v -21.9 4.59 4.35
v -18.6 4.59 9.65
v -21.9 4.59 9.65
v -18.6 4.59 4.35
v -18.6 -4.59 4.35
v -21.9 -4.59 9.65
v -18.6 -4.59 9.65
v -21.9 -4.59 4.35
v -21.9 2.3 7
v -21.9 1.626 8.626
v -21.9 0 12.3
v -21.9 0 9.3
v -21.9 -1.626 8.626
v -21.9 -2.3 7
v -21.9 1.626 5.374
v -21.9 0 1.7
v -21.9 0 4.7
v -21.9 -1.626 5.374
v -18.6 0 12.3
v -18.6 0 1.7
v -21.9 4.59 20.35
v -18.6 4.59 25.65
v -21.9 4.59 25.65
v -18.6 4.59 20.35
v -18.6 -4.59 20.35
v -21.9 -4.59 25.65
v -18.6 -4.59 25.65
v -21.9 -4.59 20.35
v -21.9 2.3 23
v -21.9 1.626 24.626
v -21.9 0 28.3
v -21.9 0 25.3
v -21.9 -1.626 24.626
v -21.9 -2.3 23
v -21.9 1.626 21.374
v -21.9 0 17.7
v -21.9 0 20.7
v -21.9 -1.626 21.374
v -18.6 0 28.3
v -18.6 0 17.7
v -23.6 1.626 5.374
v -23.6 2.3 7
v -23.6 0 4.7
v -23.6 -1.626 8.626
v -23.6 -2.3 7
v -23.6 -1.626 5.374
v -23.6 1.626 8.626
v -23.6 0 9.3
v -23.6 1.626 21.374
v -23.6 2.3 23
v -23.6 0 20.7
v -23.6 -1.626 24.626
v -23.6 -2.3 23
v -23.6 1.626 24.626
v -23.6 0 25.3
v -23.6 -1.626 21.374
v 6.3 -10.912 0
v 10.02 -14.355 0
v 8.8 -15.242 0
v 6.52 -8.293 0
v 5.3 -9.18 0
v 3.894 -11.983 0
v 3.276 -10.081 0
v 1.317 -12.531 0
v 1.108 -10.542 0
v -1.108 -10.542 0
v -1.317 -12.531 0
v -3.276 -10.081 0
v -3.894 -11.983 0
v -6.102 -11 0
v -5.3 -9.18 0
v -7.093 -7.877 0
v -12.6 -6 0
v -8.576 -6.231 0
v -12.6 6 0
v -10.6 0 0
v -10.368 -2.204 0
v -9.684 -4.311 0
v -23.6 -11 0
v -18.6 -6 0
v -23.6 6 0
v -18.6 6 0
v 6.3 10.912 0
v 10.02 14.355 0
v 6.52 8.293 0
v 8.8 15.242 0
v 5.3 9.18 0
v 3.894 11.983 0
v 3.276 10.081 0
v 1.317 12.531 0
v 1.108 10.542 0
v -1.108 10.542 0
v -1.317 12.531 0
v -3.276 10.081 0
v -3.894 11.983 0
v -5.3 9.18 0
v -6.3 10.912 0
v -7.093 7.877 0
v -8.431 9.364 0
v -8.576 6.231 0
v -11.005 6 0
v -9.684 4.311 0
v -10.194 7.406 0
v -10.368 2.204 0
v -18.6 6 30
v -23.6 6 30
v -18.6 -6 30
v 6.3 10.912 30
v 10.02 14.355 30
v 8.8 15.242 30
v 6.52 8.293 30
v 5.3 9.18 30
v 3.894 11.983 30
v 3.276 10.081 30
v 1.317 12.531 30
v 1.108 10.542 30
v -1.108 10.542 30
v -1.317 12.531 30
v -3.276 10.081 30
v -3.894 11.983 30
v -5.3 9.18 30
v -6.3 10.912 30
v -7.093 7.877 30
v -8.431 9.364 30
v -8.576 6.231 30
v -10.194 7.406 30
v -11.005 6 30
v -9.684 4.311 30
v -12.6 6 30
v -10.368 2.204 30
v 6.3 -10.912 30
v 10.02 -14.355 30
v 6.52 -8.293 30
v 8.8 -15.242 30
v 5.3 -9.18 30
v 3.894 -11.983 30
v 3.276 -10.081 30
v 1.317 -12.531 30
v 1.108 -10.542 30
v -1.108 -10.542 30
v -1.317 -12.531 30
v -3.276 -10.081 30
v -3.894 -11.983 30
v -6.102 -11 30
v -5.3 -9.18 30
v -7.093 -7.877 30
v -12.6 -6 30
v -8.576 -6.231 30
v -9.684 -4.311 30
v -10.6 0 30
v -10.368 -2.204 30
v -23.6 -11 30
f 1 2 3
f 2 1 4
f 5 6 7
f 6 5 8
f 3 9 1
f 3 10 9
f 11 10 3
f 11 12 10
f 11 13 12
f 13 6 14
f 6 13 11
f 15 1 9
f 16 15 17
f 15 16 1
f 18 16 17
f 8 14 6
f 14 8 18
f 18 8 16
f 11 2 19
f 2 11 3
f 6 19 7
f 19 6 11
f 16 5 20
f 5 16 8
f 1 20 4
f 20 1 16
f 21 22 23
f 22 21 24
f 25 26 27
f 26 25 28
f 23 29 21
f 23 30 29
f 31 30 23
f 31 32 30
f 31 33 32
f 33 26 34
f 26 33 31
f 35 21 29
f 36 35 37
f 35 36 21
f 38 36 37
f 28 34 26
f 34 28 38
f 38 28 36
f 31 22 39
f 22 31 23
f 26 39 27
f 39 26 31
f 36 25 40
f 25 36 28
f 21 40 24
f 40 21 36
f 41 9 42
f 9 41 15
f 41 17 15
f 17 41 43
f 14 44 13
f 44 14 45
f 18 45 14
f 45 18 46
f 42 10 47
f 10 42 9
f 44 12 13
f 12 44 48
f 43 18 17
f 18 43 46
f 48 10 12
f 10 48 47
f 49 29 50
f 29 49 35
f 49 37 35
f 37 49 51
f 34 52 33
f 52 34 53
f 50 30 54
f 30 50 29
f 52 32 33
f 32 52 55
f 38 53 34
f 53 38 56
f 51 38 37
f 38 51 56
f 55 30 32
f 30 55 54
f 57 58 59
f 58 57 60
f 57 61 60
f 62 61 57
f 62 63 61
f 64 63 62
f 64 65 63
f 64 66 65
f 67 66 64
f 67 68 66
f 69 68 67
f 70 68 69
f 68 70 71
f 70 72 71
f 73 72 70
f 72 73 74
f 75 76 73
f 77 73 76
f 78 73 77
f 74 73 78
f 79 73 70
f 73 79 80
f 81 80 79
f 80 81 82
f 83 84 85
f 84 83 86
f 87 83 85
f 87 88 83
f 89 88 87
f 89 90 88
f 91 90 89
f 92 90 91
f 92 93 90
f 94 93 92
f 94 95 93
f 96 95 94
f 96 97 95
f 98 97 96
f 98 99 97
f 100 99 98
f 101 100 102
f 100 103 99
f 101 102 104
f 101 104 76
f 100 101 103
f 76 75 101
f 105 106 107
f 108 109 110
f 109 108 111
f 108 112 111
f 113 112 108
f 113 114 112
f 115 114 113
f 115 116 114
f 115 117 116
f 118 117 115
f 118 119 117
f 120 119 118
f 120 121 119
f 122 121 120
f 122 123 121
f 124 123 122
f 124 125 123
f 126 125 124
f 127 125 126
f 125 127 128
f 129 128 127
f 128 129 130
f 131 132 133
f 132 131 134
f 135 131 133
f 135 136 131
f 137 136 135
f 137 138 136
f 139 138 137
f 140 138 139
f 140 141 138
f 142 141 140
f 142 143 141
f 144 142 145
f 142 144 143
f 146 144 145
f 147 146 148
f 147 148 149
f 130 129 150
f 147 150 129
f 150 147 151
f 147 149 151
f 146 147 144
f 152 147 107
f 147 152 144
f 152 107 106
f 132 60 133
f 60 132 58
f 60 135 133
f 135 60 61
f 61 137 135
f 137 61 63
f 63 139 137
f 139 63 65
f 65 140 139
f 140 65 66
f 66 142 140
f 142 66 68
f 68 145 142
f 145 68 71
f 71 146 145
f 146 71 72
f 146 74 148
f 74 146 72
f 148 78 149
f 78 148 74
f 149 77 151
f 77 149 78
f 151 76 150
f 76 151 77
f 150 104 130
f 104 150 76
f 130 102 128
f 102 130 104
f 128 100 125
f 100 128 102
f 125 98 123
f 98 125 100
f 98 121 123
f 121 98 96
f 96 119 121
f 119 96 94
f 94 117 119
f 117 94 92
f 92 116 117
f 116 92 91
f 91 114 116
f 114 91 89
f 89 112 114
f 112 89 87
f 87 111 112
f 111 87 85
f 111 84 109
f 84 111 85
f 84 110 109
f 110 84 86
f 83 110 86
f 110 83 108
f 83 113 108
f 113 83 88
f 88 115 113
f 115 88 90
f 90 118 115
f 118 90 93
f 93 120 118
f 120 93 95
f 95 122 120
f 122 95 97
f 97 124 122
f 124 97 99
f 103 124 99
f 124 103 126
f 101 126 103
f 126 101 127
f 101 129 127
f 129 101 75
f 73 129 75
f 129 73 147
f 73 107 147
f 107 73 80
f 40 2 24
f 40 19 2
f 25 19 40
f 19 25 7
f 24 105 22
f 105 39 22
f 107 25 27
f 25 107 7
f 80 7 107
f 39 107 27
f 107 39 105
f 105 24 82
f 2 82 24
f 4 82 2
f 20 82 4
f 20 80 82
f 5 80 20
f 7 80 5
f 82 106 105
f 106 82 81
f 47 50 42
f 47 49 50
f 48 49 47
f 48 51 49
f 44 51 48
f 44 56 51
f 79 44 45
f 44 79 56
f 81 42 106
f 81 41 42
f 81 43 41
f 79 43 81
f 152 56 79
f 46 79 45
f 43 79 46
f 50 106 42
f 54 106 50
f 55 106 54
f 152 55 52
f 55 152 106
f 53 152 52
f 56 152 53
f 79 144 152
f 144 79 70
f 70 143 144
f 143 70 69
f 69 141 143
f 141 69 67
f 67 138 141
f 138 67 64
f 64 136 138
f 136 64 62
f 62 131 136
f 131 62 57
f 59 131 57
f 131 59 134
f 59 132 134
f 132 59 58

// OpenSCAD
//overall width of clip, in mm, measure hardhat slot, 25mm minimum
clip_width=30; 

//Diameter of flashlight, in mm, 21.2 for Sipik SK-68 cloen
diam=21.2;

//Thickness of clip, in mm
thickness=2;

//length of release tab, in mm
release_tab_length=5;

//size of nut trap, 6mm max
nut_trap_size=5.3;

//size of screw holes
screw_hole_size=4.6;

module insertion_tabs() //tabs at mouth of clip (draws a big wide triangle
{
polygon([[0,0],[50,50*sqrt(3)],[50,-50*sqrt(3)]],[[0,1,2]]);
}

module insertion_tabs_trim() //trims off big triangle leaving the two tabs
{
translate([(thickness/2)*sqrt(3),0])
{
polygon([[0,0],[50,50*sqrt(3)],[50,-50*sqrt(3)]],[[0,1,2]]);
}
difference()
{
circle(r=100);
circle(r=(diam/2)+thickness+release_tab_length);
}
}




module clamp() //draws clamp section
translate([-(diam/2)-thickness,-2.5,0])
{
difference()
{
square([22,17],center=true);
translate([-3,2.5,0])
{
square([6,12],center=true);
}
}
}


module nut_trap()
{
union()
{
translate([-(diam/2)-thickness-6-3.3,0,7])
{
rotate(90,[0,1,0])
{
linear_extrude(height=3.4)
{
circle(r=nut_trap_size,$fn=6);
}
}
}

translate([-(diam/2)-thickness-6-3.3,0,clip_width-7])
{
rotate(90,[0,1,0])
{
linear_extrude(height=3.4)
{
circle(r=nut_trap_size,$fn=6);
}
}
}
}
}


module clamp_holes()
{
union()
{
translate([-(diam/2)-thickness-6-6,0,7])
{
rotate(90,[0,1,0])
{
linear_extrude(height=6)
{
#circle(r=screw_hole_size/2);
}
}
}

translate([-(diam/2)-thickness-6-6,0,clip_width-7])
{
rotate(90,[0,1,0])
{
linear_extrude(height=6)
{
#circle(r=2.3);
}
}
}
}
}



//main body
difference()
{
linear_extrude(height=clip_width)
{
union()
{
difference()
	{
		union()
		{
			circle(r=(diam/2)+thickness);
			insertion_tabs();
			
		}	
		insertion_tabs_trim();
		circle(r=(diam/2));
	}
difference()
{
clamp();
circle(r=(diam/2));
}
}
}
nut_trap();
clamp_holes();
}

